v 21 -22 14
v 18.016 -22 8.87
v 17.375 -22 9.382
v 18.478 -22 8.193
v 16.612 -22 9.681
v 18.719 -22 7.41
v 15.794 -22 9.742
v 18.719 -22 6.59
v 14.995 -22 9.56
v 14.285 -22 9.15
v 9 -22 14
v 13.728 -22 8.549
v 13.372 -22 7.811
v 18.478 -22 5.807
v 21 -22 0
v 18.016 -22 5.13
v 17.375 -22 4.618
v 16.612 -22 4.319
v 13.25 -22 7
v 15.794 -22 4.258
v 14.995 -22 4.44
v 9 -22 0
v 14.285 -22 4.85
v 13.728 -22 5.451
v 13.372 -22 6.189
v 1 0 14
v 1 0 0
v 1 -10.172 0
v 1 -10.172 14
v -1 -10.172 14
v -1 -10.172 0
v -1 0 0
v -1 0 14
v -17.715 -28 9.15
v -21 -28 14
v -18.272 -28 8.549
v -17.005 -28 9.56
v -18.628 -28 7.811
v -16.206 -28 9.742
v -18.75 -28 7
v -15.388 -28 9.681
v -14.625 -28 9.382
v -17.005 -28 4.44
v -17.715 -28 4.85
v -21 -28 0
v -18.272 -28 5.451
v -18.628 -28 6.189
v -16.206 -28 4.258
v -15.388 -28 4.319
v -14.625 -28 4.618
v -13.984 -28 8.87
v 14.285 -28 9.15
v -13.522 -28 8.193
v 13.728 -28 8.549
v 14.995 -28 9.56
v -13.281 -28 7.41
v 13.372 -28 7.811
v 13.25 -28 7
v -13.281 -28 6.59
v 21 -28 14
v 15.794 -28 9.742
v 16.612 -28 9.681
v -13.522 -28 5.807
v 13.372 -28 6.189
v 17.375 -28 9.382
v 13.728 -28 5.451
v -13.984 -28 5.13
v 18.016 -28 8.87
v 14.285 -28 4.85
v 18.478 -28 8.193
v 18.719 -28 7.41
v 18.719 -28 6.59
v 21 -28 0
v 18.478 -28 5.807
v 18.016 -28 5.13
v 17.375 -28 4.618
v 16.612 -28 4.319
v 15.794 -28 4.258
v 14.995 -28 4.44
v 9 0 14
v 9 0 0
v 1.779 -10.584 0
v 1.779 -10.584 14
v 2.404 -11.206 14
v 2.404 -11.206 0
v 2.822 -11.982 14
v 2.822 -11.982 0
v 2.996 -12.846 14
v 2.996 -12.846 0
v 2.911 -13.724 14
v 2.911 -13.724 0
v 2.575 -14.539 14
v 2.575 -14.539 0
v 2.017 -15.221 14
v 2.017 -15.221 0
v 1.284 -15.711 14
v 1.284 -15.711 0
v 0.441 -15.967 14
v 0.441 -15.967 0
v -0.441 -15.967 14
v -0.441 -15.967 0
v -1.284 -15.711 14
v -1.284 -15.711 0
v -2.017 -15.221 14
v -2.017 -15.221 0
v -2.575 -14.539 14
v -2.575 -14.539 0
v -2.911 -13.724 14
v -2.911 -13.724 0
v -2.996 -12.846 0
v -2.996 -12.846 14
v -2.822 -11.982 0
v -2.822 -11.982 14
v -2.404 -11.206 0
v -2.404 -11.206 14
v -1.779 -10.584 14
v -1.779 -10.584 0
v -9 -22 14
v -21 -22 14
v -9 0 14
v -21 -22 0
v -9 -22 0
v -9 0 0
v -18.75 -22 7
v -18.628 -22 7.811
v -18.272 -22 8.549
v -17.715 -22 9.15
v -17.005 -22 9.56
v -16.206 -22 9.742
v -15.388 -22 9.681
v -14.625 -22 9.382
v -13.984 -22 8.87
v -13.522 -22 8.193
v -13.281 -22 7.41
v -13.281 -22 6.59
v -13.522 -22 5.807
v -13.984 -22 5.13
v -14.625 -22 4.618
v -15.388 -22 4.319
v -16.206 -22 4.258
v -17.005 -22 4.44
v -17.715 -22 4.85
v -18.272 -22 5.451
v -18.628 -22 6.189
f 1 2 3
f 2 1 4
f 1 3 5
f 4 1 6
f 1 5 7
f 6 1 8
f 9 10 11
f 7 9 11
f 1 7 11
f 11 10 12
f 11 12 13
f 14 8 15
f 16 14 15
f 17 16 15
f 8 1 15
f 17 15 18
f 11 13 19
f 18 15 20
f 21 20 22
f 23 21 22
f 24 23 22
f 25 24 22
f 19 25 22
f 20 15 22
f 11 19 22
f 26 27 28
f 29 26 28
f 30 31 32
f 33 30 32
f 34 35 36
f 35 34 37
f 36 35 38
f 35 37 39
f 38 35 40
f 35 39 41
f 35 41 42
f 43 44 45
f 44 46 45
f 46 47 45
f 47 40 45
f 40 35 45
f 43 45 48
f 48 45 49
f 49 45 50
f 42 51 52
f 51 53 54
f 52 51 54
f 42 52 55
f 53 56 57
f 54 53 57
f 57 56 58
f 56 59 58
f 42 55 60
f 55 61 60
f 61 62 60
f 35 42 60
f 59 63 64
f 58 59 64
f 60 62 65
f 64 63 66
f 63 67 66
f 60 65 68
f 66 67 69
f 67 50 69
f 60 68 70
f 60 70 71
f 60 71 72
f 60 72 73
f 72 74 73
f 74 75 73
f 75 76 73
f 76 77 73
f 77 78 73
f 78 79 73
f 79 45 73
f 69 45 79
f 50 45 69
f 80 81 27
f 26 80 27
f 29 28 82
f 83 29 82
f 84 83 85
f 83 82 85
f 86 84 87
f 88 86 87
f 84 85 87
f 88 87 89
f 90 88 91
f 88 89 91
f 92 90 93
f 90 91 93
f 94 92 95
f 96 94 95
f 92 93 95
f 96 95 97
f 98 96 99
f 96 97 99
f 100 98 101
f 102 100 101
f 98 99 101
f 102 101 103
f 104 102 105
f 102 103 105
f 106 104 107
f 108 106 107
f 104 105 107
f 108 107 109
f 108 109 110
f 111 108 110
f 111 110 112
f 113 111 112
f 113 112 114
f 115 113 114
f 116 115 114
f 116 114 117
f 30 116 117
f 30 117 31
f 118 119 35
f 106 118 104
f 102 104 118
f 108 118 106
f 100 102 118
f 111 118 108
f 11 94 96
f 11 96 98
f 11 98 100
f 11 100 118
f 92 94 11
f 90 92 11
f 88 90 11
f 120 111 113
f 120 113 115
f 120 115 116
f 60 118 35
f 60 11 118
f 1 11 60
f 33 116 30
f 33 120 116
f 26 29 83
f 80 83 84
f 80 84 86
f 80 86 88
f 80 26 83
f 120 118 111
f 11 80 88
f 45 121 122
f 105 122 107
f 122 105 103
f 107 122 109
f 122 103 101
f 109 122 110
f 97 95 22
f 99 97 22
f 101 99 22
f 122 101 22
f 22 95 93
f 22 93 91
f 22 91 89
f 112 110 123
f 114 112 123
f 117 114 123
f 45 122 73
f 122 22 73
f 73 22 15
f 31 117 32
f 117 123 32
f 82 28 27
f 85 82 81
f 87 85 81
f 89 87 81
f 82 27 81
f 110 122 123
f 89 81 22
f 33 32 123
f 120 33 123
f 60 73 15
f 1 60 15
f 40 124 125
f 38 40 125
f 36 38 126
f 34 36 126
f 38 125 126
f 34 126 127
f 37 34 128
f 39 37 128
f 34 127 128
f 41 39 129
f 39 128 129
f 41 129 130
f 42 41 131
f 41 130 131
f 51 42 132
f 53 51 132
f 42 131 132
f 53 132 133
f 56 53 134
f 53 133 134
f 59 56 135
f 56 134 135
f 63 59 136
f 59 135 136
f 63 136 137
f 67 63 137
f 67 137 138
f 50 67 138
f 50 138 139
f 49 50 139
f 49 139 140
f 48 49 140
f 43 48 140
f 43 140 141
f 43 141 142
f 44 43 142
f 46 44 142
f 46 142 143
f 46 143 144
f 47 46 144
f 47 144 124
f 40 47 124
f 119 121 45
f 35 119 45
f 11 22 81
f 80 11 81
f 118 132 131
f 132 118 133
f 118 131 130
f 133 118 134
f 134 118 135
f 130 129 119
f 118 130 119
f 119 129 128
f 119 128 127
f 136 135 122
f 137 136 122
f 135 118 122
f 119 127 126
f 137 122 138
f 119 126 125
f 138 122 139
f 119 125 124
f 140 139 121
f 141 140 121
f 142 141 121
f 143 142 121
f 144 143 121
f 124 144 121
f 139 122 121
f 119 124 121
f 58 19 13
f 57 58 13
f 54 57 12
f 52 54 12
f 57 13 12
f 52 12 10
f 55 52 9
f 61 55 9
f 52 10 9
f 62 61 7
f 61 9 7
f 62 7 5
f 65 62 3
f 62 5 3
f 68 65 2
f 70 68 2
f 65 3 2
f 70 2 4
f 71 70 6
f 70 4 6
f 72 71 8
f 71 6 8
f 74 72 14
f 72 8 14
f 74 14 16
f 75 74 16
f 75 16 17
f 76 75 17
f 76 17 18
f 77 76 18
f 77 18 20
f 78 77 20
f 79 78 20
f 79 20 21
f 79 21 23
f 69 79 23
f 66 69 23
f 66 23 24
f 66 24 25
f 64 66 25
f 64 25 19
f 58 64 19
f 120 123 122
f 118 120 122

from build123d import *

# Parameters (mm, degrees)
EXTRUDE_1_DEPTH     = 14
SKETCH_2_R          = 2.75
CUT_EXTRUDE_1_DEPTH = 34.481338086


with BuildPart() as part:
    # 草图1 → 凸台-拉伸1 (new body)
    with BuildSketch(Plane.XY):
        with BuildLine():
            Line((-1, 0), (-9, 0))
            Line((-9, 0), (-9, -22))
            Line((-9, -22), (-21, -22))
            Line((-21, -22), (-21, -28))
            Line((-21, -28), (21, -28))
            Line((21, -28), (21, -22))
            Line((21, -22), (9, -22))
            Line((9, -22), (9, 0))
            Line((9, 0), (1, 0))
            Line((1, 0), (1, -10.171572875))
            ThreePointArc((1, -10.171572875), (0, -16), (-1, -10.171572875))
            Line((-1, -10.171572875), (-1, 0))
        make_face()
    extrude(amount=EXTRUDE_1_DEPTH)

    # 草图2 → 切除-拉伸1 (cut, through all)
    with BuildSketch(Plane(origin=(0, -22, 0), x_dir=(1, 0, 0), z_dir=(0, 1, 0))):
        with Locations(Location((-16, -7, 0), (0, 0, 180))):
            Circle(SKETCH_2_R)
        with Locations(Location((16, -7, 0), (0, 0, 180))):
            Circle(SKETCH_2_R)
    extrude(amount=-CUT_EXTRUDE_1_DEPTH, mode=Mode.SUBTRACT)


solid = part.part
